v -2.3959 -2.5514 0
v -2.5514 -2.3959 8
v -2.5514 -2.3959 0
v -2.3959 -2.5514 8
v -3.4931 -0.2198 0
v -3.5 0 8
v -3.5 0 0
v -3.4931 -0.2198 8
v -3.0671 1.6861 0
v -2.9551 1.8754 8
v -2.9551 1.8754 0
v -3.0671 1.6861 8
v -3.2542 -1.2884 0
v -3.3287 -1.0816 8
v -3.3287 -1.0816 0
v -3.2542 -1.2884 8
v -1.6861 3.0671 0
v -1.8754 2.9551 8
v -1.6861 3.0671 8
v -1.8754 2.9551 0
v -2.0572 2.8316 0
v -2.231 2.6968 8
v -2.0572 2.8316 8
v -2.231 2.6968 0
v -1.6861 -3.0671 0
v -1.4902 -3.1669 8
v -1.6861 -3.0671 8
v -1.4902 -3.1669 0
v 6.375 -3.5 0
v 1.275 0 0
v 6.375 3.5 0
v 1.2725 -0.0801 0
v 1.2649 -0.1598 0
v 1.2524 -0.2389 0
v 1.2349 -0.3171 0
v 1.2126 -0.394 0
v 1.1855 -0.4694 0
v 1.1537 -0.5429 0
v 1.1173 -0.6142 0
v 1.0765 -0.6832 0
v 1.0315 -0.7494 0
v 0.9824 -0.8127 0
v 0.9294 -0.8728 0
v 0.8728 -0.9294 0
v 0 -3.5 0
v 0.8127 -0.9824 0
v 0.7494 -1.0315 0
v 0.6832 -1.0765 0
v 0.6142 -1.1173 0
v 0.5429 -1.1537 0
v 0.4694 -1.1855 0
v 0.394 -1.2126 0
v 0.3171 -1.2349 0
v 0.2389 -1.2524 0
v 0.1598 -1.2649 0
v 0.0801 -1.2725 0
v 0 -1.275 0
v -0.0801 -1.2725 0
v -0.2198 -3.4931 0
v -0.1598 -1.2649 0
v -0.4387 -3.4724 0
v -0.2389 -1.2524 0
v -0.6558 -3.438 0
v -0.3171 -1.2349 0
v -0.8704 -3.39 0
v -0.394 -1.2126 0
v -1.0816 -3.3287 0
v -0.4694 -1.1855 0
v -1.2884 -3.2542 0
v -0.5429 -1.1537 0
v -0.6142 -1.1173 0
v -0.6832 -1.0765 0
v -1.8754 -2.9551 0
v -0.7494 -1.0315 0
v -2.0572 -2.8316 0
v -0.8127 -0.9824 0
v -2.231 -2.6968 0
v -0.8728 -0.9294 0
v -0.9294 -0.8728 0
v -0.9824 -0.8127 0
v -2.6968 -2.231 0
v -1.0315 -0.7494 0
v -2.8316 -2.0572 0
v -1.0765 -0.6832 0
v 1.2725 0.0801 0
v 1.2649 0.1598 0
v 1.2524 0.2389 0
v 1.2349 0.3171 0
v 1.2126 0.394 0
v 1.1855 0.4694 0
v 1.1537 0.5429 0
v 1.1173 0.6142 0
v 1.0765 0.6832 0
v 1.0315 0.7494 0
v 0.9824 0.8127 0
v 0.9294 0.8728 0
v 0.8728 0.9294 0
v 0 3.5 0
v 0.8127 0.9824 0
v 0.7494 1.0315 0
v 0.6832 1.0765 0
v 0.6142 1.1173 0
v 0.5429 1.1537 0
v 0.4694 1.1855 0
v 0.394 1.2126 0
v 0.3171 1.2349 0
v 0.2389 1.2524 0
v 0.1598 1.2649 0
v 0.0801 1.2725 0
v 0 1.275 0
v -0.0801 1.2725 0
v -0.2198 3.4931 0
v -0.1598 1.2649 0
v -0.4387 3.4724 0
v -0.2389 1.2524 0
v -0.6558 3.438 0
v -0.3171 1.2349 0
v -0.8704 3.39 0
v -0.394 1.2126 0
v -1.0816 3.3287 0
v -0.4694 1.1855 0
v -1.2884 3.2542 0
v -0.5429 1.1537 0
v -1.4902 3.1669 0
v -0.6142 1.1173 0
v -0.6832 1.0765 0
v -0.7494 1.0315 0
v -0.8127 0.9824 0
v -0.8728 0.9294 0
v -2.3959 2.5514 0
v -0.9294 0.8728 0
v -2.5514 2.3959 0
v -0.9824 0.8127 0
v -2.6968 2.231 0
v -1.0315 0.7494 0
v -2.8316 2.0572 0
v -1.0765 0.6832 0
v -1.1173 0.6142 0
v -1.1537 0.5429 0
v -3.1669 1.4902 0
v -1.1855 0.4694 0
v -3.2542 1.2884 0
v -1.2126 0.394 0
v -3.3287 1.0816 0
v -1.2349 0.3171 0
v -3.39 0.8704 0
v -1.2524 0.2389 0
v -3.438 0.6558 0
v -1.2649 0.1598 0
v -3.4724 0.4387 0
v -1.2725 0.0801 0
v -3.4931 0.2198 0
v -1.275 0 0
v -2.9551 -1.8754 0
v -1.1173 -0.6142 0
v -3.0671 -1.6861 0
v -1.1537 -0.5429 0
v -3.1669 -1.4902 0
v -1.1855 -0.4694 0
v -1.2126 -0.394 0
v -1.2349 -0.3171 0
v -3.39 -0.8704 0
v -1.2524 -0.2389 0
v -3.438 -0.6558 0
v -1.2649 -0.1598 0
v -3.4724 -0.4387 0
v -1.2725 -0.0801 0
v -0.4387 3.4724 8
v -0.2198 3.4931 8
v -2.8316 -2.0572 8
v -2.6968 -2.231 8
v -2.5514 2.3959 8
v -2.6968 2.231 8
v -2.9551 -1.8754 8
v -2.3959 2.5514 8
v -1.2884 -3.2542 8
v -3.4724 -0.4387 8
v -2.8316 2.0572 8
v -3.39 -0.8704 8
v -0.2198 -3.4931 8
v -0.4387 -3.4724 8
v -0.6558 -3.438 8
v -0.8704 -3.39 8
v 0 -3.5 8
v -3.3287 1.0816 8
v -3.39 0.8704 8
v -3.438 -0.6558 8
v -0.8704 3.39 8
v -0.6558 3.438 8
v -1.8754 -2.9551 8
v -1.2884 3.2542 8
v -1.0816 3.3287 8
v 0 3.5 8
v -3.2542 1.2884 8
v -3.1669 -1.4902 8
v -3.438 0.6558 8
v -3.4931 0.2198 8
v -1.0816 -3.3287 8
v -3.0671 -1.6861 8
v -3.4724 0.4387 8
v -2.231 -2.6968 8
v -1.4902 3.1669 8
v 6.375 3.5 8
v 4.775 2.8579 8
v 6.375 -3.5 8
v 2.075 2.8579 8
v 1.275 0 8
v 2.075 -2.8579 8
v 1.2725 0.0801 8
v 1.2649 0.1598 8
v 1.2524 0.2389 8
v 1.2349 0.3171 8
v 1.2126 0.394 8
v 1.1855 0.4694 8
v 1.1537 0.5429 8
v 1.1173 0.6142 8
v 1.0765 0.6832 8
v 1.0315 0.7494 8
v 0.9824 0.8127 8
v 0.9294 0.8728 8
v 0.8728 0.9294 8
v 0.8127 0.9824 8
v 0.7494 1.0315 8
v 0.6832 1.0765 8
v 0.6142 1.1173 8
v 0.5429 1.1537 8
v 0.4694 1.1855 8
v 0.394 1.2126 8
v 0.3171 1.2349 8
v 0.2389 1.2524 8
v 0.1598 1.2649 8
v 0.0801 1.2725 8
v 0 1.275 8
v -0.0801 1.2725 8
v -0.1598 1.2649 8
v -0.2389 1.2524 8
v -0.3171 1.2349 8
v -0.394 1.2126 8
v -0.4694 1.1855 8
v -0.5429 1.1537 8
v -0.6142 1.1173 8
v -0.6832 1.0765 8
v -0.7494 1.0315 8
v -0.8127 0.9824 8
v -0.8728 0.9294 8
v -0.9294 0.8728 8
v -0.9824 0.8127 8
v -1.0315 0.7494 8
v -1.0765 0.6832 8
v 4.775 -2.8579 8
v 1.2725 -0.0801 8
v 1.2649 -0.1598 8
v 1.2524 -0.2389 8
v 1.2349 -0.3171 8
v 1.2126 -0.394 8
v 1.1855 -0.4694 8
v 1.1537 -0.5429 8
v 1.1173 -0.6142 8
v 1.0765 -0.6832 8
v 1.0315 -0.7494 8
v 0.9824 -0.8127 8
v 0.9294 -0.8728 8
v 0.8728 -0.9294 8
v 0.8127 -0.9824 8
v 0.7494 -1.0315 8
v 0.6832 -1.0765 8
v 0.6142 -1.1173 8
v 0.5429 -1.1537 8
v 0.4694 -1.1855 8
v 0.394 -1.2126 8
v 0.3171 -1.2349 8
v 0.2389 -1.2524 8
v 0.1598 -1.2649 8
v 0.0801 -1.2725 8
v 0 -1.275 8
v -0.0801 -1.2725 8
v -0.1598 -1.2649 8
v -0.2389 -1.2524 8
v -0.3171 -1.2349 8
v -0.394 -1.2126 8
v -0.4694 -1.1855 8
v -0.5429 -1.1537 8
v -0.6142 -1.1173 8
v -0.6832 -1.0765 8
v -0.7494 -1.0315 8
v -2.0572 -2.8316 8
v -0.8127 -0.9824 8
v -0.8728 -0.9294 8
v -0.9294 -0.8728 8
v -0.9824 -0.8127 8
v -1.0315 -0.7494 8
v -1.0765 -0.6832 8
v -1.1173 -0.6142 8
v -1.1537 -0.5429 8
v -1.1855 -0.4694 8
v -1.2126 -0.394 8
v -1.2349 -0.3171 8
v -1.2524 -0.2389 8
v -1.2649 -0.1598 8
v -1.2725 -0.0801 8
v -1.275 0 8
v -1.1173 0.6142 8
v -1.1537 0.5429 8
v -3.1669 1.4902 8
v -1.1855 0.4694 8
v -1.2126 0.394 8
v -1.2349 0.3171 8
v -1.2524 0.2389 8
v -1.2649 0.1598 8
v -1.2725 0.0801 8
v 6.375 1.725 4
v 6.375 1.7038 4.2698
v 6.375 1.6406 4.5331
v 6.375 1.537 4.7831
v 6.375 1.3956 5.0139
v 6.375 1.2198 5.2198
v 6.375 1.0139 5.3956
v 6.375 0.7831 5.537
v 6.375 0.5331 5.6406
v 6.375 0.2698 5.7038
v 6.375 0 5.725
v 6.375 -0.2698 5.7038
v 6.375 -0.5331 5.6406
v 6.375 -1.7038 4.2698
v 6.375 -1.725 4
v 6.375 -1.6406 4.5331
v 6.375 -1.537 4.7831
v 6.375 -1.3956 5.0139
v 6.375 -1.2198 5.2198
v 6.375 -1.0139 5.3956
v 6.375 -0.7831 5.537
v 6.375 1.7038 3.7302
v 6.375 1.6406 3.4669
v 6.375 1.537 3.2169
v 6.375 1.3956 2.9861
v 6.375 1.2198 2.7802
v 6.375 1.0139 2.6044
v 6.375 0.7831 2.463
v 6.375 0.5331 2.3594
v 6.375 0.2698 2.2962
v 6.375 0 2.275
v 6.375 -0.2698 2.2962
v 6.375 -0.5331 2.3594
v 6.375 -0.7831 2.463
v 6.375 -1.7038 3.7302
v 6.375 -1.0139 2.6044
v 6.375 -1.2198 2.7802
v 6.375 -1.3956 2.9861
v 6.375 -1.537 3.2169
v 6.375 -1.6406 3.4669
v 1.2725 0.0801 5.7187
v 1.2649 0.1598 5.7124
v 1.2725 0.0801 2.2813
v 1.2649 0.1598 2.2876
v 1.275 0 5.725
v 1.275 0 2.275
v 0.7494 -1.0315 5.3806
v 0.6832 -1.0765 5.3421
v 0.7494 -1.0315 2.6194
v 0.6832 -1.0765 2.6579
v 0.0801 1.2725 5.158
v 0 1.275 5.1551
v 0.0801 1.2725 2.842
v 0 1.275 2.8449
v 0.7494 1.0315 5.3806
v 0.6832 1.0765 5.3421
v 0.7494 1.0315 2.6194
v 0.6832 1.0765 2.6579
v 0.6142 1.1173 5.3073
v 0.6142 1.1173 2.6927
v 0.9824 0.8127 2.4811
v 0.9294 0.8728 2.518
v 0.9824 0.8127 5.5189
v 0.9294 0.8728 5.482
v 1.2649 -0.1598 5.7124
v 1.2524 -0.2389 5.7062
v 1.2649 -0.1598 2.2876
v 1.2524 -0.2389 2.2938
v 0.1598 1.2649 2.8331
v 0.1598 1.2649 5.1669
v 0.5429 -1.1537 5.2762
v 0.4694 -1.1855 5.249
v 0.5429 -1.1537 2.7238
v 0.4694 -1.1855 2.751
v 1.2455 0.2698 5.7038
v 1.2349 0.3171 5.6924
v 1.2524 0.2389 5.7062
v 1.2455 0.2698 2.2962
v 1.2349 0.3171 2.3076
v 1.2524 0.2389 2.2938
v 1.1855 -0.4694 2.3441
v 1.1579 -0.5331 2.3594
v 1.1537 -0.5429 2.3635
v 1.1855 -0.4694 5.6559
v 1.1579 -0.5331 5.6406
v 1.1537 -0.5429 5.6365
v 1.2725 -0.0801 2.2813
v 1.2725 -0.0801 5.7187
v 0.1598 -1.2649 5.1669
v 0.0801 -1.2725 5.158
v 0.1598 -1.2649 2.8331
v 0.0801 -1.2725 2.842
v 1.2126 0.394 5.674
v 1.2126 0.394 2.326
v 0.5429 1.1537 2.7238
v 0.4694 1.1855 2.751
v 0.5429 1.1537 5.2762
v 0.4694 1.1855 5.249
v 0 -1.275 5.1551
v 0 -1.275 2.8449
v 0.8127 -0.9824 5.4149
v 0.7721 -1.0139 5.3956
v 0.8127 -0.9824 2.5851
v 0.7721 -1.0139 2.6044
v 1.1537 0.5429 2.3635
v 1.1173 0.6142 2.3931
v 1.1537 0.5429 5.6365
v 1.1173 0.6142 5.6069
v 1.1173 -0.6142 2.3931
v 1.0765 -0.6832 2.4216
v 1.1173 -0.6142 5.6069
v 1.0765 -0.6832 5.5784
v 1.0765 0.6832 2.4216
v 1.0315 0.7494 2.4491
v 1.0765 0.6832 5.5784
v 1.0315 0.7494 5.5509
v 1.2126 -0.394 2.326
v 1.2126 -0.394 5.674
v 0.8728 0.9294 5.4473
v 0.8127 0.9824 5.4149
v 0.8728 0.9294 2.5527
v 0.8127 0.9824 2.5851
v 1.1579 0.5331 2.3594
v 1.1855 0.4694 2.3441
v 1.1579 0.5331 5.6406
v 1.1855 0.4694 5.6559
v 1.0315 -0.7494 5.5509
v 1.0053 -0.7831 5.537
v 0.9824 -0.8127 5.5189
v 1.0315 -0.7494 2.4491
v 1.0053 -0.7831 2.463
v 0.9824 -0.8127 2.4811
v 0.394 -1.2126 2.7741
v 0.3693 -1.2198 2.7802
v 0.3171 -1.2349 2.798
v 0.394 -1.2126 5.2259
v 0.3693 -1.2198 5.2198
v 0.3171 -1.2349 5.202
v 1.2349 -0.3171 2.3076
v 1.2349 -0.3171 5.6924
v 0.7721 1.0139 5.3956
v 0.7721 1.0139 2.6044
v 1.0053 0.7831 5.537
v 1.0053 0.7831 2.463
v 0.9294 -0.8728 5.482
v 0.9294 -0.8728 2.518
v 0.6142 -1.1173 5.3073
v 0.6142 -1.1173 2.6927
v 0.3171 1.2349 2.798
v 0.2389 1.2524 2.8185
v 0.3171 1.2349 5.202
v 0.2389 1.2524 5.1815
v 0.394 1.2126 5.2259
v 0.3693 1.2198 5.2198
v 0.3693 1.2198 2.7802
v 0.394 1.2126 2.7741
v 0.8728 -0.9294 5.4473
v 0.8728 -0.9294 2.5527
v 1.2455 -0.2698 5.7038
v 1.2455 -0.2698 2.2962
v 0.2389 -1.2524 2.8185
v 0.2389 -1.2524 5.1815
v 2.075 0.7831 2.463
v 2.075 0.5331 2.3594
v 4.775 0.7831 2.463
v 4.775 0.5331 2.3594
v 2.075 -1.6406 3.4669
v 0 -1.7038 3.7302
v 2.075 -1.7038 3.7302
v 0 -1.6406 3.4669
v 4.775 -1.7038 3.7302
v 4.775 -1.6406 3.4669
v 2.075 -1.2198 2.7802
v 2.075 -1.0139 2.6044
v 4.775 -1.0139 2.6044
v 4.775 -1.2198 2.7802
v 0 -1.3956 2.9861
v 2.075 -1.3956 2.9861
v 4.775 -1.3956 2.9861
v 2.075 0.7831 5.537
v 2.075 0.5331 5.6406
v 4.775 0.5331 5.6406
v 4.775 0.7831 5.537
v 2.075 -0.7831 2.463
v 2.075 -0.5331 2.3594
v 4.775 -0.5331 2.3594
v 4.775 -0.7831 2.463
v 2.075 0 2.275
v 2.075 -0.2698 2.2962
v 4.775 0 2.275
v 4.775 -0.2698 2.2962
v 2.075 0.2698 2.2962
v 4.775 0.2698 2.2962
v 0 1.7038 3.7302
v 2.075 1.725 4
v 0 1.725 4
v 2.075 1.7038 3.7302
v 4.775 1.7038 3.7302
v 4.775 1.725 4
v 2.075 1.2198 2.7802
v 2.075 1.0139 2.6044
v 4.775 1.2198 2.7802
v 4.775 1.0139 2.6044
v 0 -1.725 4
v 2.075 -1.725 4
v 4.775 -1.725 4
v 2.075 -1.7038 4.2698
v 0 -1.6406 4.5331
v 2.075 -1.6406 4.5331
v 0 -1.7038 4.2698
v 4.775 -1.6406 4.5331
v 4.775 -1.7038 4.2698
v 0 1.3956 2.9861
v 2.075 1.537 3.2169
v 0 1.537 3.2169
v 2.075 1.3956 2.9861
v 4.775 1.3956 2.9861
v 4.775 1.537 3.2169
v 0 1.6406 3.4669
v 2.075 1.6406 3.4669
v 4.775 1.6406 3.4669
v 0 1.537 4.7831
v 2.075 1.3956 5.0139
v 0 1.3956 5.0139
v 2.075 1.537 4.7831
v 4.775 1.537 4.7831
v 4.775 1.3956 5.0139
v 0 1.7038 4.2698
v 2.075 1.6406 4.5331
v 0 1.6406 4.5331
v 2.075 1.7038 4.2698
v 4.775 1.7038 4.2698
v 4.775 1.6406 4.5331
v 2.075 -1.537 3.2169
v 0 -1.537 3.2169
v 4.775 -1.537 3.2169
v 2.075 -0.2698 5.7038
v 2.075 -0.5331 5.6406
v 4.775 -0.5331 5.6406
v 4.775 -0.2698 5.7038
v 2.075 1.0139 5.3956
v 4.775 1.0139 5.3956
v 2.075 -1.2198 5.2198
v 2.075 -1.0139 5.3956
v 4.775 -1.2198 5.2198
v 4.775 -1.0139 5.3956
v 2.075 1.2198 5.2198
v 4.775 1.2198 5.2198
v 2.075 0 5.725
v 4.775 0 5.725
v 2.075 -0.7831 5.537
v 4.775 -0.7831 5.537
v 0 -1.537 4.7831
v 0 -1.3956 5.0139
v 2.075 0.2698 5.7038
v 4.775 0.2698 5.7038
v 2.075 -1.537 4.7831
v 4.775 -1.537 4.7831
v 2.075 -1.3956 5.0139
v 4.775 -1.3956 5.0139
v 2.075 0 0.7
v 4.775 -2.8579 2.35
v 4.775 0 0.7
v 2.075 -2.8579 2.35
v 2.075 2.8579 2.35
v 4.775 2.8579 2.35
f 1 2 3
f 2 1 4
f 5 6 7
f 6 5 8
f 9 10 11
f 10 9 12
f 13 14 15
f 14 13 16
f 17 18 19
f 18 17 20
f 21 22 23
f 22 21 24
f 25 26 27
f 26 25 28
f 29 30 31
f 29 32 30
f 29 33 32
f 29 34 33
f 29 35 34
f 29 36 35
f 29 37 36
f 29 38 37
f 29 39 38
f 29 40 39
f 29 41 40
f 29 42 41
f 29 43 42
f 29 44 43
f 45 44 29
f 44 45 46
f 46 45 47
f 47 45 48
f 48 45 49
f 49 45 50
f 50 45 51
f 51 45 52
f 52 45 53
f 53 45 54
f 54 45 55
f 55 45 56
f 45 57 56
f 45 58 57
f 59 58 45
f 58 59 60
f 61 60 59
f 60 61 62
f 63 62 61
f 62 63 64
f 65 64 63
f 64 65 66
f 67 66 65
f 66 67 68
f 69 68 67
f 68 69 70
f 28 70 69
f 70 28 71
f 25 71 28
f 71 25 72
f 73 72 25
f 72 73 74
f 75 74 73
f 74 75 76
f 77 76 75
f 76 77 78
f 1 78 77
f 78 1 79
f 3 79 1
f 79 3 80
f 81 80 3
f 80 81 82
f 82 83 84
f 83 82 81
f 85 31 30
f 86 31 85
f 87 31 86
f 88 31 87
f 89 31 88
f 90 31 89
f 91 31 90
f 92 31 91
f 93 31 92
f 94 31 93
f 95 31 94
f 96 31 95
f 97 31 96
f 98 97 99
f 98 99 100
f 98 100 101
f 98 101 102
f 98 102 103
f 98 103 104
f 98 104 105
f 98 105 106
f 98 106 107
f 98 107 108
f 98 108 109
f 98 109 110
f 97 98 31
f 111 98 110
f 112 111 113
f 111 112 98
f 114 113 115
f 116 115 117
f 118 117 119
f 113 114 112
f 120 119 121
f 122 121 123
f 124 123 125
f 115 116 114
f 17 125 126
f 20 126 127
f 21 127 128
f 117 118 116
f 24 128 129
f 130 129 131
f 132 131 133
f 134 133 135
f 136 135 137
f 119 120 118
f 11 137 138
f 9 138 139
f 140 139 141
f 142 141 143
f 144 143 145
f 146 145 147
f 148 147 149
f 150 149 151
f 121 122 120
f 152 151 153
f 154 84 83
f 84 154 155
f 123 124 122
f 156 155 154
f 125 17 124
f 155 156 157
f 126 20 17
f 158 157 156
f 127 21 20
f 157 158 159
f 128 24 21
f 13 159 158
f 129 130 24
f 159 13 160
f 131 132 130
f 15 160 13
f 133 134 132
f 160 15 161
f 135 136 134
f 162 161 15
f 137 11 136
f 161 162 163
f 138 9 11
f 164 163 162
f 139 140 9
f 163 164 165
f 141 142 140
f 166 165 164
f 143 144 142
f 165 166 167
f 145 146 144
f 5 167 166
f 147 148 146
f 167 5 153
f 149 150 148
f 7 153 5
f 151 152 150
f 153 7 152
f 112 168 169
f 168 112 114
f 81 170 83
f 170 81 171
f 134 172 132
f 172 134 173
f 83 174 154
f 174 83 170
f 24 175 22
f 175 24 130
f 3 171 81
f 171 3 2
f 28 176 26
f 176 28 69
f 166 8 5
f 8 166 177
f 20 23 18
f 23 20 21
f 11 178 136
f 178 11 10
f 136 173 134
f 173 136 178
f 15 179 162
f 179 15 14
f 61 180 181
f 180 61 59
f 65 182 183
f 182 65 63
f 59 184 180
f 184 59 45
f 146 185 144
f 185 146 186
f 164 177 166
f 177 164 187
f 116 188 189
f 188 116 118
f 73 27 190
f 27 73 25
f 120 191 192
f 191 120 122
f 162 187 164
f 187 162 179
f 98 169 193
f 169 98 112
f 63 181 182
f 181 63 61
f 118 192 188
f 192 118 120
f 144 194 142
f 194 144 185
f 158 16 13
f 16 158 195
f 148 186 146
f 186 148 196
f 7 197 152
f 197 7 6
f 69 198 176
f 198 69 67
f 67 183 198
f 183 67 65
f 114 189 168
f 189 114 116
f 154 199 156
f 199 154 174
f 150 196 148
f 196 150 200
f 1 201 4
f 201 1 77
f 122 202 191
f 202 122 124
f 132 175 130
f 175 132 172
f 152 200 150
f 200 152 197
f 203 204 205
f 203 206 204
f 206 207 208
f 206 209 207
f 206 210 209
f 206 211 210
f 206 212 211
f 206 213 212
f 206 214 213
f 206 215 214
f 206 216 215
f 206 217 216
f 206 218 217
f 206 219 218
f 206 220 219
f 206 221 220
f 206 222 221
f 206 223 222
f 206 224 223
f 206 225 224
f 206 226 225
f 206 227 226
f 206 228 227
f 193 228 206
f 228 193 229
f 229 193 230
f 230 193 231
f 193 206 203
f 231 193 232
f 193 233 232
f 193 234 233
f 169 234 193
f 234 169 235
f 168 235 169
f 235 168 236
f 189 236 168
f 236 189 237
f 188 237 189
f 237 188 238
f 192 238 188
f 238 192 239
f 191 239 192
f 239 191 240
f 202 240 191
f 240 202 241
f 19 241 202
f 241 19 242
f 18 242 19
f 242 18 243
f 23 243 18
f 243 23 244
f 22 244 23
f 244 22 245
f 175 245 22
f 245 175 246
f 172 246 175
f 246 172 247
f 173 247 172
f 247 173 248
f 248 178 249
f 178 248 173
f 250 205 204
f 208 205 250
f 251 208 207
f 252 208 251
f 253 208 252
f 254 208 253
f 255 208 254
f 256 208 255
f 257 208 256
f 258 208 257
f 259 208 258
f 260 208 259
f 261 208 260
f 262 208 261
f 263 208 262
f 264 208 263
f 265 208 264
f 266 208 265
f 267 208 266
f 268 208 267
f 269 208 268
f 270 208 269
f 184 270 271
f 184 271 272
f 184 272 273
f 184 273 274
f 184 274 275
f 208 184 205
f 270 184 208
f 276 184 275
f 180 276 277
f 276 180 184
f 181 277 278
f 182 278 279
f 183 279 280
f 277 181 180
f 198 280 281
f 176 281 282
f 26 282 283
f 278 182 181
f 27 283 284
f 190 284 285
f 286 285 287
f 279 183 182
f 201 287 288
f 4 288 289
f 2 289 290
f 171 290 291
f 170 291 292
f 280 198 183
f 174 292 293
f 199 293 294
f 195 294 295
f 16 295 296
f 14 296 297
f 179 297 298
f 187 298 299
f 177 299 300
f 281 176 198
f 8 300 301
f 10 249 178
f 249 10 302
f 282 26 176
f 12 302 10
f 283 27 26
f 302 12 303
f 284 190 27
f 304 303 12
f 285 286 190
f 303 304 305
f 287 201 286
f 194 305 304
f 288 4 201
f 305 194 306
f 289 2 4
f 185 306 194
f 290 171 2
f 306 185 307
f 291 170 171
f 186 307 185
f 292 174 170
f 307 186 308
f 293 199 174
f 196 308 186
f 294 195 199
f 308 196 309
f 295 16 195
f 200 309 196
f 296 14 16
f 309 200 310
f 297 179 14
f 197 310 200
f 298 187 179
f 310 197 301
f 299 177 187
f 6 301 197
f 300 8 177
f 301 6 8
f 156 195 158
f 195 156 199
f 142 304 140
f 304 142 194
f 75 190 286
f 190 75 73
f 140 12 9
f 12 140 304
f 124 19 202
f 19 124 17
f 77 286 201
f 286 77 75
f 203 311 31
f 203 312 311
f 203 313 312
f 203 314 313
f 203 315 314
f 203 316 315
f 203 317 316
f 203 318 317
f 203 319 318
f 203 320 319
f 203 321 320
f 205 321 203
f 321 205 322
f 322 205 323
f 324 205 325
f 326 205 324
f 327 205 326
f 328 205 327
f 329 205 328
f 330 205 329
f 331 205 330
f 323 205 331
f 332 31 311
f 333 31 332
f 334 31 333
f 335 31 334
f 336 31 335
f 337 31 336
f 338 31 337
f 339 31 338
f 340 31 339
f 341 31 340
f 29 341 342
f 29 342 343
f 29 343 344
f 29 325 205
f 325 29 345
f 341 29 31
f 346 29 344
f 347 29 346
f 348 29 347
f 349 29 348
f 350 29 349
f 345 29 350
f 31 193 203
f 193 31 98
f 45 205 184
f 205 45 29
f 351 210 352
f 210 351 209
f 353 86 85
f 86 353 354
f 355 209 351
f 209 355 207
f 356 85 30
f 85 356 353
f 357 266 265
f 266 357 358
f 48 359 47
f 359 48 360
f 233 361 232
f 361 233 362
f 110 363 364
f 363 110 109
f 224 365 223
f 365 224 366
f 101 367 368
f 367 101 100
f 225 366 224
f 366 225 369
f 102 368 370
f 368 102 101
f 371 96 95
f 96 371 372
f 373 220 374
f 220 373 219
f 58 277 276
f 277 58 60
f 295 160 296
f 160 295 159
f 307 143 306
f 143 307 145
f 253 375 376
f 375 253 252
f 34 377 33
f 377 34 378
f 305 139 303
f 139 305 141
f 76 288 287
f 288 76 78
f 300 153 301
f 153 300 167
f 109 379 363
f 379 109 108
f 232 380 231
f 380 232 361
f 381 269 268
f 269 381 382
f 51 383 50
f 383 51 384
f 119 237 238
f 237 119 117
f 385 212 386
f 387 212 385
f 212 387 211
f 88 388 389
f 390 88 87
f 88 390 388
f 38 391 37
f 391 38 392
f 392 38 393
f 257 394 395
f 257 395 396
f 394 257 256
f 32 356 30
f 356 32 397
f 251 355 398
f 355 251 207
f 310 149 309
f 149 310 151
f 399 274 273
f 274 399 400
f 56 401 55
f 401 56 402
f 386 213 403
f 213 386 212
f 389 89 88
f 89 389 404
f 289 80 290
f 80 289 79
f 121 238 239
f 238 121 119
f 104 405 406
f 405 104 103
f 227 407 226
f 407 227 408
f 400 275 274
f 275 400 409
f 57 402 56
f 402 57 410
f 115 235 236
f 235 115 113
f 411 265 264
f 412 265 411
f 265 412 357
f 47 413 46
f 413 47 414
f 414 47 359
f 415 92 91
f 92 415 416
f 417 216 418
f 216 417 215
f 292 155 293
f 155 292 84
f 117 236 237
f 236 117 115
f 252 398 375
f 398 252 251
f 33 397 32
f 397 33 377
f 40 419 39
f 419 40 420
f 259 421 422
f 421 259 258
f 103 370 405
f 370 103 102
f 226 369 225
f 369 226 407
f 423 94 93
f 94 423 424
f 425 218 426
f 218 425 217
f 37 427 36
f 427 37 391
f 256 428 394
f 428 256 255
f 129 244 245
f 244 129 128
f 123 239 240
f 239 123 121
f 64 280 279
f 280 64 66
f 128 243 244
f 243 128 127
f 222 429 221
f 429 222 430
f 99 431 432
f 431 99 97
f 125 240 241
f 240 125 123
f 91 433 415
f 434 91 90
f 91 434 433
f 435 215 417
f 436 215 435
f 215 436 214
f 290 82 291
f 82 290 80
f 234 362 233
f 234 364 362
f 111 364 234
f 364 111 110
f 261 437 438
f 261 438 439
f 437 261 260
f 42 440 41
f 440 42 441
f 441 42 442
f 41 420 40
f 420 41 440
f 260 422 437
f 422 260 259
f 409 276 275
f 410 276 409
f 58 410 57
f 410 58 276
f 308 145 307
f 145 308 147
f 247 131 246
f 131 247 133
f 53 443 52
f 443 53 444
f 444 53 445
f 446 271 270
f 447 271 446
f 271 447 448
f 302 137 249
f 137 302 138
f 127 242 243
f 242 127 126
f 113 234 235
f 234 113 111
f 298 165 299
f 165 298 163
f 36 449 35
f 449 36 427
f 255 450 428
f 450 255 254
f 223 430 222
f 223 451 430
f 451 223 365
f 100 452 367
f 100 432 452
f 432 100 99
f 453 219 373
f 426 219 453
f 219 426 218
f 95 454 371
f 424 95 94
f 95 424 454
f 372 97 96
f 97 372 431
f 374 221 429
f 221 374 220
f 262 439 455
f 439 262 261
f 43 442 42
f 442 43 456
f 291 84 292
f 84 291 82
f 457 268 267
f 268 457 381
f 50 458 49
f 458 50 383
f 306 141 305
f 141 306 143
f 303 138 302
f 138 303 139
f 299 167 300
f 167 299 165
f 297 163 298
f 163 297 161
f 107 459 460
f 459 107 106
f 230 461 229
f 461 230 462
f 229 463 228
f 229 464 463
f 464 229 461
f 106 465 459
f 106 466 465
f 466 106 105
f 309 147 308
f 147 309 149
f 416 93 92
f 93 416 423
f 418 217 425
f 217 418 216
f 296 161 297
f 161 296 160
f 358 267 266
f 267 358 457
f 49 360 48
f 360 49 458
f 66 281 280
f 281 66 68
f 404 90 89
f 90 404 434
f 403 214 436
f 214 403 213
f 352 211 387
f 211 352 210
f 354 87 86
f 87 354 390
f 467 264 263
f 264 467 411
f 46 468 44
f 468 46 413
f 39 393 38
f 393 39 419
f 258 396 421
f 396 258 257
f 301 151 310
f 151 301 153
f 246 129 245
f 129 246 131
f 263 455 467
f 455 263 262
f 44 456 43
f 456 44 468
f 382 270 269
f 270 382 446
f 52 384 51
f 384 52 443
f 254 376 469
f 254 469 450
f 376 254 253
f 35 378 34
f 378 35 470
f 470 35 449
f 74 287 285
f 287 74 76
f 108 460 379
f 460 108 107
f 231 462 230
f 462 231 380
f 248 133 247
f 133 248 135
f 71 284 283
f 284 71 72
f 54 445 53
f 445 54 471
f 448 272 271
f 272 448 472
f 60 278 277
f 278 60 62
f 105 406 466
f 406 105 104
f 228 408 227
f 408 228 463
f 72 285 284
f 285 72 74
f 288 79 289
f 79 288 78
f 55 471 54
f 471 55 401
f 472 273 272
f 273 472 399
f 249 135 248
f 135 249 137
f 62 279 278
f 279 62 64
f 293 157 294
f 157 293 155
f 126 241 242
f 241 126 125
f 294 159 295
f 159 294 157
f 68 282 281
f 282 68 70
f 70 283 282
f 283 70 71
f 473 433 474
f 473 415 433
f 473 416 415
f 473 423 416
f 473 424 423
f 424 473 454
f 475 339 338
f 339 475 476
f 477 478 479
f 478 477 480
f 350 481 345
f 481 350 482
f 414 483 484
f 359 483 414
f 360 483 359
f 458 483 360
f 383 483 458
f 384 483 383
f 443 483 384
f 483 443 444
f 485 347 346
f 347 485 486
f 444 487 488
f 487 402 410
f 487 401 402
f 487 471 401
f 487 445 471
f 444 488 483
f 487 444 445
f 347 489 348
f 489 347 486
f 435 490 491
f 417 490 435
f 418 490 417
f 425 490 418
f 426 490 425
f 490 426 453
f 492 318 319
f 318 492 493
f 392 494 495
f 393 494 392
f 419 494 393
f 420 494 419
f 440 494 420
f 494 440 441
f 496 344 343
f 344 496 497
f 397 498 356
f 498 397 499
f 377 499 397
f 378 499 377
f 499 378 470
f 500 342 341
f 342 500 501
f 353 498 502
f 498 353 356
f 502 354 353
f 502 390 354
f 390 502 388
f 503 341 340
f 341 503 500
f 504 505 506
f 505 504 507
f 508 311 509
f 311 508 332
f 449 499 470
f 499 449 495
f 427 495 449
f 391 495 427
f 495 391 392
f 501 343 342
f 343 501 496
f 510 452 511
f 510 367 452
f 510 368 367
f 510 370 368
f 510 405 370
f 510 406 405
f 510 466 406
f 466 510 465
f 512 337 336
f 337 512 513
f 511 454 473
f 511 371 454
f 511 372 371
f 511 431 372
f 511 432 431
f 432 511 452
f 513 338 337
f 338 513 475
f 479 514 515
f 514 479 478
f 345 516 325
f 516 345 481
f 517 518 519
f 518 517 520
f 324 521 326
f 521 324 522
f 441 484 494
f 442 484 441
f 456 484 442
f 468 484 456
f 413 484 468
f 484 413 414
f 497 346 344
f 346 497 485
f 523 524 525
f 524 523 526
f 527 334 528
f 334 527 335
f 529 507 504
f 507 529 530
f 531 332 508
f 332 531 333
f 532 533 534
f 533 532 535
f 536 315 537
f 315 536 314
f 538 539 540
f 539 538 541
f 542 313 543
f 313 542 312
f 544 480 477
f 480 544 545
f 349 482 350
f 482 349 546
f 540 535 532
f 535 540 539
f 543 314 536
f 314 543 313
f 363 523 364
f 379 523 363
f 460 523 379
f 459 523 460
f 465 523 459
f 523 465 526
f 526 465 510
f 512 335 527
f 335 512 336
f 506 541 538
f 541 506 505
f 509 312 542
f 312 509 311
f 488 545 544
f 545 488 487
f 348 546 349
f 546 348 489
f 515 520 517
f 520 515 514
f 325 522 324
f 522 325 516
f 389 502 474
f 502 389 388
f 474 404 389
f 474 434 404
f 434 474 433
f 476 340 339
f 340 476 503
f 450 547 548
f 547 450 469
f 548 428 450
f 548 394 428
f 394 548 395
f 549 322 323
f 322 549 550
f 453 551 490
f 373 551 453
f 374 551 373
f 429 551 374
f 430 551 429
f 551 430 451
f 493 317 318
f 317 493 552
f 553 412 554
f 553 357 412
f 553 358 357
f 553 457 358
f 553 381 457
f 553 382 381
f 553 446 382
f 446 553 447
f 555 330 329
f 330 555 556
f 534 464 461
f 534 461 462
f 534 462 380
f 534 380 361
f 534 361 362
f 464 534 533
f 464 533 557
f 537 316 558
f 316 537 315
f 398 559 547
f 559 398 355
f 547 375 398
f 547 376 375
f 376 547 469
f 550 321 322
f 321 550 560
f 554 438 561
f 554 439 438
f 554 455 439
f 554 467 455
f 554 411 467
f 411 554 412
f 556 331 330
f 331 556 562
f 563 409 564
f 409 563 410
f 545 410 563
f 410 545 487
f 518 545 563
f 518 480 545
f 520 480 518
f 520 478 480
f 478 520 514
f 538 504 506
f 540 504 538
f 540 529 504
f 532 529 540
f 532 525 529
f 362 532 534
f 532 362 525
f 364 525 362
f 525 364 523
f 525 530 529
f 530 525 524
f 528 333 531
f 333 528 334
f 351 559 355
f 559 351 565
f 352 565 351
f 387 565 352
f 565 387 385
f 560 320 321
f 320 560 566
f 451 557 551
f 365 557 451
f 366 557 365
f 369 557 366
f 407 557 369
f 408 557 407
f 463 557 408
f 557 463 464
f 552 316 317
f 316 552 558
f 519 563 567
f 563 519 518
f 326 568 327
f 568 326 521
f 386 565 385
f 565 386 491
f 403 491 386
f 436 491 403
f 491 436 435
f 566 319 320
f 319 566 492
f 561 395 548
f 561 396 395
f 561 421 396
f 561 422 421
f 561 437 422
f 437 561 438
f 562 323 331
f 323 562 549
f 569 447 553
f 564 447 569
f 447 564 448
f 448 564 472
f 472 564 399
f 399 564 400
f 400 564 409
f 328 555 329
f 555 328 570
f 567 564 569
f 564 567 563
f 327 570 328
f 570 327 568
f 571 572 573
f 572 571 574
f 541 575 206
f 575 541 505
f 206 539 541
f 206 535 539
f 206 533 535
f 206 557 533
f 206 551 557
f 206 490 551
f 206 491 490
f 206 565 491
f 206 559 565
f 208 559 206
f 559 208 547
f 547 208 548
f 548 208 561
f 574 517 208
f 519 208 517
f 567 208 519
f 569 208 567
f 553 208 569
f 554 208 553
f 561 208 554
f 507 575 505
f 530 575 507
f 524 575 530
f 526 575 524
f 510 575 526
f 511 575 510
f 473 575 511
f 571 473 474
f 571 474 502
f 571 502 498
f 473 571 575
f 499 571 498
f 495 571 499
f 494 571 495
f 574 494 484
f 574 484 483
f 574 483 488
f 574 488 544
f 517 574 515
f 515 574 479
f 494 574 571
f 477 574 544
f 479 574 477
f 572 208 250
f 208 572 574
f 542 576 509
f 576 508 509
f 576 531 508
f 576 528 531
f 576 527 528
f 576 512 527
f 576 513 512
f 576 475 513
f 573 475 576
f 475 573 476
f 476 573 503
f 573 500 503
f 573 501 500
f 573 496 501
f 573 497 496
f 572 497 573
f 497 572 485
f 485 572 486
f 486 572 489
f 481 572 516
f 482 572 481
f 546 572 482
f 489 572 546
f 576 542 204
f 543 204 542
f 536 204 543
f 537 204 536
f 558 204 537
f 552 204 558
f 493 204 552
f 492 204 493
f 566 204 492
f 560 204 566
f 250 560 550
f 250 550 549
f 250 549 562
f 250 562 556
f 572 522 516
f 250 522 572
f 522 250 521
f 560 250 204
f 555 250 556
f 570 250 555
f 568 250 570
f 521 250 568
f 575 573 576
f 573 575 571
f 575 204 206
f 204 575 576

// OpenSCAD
// file: configuration.scad
// Increase this if your slicer or printer make holes too tight.
extra_radius = 0.1;

// OD = outside diameter, corner to corner.
m3_nut_od = 6.1;
m3_nut_radius = m3_nut_od/2 + 0.2 + extra_radius;
m3_washer_radius = 3.5 + extra_radius;

// Major diameter of metric 3mm thread.
m3_major = 2.85;
m3_radius = m3_major/2 + extra_radius;
m3_wide_radius = m3_major/2 + extra_radius + 0.2;

// NEMA17 stepper motors.
motor_shaft_diameter = 5;
motor_shaft_radius = motor_shaft_diameter/2 + extra_radius;

// Frame brackets. M3x8mm screws work best with 3.6 mm brackets.
thickness = 3.6;

// OpenBeam or Misumi. Currently only 15x15 mm, but there is a plan
// to make models more parametric and allow 20x20 mm in the future.
extrusion = 15;

// Placement for the NEMA17 stepper motors.
motor_offset = 44;
motor_length = 47;
// main file
include <configuration.scad>;

d_probe = 2.35 + 2*extra_radius; // probe diameter (mm)
d_clamp = 7;                    // outside diameter of the clamp (mm)
h_clamp = 8;                    // clamp heigth (mm)
d_nut = 6.4 + 2*extra_radius;   // hex nut diameter, M3 = 6.1 (mm)
h_nut = 2.5 + 2*extra_radius;   // hex thickness (mm)
delta_nut = 0.8;                // slight nut shift toward zprobe and space on the opposite side (mm)
$fn = 40;

difference() {
  union() {
    cylinder(r=d_clamp/2, h=h_clamp, $fn=100);
    translate([0, -d_clamp/2, 0]) cube([d_probe/2+h_nut+3*delta_nut, d_clamp, h_clamp]);
  };
  cylinder(r=d_probe/2, h=h_clamp, $fn=100);
  translate([0, 0, h_clamp/2]) rotate(a=90, v=[0,1,0]) cylinder(r=m3_wide_radius, h=2*d_clamp);

  translate([d_probe/2+delta_nut, 0, h_clamp/2]) rotate(a=90, v=[0,1,0]) cylinder(r=d_nut/2, h=h_nut, $fn=6);
  translate([d_probe/2+delta_nut, -d_nut*cos(30)/2, h_clamp-d_nut/2]) cube([h_nut, d_nut*cos(30), d_nut]);
};
